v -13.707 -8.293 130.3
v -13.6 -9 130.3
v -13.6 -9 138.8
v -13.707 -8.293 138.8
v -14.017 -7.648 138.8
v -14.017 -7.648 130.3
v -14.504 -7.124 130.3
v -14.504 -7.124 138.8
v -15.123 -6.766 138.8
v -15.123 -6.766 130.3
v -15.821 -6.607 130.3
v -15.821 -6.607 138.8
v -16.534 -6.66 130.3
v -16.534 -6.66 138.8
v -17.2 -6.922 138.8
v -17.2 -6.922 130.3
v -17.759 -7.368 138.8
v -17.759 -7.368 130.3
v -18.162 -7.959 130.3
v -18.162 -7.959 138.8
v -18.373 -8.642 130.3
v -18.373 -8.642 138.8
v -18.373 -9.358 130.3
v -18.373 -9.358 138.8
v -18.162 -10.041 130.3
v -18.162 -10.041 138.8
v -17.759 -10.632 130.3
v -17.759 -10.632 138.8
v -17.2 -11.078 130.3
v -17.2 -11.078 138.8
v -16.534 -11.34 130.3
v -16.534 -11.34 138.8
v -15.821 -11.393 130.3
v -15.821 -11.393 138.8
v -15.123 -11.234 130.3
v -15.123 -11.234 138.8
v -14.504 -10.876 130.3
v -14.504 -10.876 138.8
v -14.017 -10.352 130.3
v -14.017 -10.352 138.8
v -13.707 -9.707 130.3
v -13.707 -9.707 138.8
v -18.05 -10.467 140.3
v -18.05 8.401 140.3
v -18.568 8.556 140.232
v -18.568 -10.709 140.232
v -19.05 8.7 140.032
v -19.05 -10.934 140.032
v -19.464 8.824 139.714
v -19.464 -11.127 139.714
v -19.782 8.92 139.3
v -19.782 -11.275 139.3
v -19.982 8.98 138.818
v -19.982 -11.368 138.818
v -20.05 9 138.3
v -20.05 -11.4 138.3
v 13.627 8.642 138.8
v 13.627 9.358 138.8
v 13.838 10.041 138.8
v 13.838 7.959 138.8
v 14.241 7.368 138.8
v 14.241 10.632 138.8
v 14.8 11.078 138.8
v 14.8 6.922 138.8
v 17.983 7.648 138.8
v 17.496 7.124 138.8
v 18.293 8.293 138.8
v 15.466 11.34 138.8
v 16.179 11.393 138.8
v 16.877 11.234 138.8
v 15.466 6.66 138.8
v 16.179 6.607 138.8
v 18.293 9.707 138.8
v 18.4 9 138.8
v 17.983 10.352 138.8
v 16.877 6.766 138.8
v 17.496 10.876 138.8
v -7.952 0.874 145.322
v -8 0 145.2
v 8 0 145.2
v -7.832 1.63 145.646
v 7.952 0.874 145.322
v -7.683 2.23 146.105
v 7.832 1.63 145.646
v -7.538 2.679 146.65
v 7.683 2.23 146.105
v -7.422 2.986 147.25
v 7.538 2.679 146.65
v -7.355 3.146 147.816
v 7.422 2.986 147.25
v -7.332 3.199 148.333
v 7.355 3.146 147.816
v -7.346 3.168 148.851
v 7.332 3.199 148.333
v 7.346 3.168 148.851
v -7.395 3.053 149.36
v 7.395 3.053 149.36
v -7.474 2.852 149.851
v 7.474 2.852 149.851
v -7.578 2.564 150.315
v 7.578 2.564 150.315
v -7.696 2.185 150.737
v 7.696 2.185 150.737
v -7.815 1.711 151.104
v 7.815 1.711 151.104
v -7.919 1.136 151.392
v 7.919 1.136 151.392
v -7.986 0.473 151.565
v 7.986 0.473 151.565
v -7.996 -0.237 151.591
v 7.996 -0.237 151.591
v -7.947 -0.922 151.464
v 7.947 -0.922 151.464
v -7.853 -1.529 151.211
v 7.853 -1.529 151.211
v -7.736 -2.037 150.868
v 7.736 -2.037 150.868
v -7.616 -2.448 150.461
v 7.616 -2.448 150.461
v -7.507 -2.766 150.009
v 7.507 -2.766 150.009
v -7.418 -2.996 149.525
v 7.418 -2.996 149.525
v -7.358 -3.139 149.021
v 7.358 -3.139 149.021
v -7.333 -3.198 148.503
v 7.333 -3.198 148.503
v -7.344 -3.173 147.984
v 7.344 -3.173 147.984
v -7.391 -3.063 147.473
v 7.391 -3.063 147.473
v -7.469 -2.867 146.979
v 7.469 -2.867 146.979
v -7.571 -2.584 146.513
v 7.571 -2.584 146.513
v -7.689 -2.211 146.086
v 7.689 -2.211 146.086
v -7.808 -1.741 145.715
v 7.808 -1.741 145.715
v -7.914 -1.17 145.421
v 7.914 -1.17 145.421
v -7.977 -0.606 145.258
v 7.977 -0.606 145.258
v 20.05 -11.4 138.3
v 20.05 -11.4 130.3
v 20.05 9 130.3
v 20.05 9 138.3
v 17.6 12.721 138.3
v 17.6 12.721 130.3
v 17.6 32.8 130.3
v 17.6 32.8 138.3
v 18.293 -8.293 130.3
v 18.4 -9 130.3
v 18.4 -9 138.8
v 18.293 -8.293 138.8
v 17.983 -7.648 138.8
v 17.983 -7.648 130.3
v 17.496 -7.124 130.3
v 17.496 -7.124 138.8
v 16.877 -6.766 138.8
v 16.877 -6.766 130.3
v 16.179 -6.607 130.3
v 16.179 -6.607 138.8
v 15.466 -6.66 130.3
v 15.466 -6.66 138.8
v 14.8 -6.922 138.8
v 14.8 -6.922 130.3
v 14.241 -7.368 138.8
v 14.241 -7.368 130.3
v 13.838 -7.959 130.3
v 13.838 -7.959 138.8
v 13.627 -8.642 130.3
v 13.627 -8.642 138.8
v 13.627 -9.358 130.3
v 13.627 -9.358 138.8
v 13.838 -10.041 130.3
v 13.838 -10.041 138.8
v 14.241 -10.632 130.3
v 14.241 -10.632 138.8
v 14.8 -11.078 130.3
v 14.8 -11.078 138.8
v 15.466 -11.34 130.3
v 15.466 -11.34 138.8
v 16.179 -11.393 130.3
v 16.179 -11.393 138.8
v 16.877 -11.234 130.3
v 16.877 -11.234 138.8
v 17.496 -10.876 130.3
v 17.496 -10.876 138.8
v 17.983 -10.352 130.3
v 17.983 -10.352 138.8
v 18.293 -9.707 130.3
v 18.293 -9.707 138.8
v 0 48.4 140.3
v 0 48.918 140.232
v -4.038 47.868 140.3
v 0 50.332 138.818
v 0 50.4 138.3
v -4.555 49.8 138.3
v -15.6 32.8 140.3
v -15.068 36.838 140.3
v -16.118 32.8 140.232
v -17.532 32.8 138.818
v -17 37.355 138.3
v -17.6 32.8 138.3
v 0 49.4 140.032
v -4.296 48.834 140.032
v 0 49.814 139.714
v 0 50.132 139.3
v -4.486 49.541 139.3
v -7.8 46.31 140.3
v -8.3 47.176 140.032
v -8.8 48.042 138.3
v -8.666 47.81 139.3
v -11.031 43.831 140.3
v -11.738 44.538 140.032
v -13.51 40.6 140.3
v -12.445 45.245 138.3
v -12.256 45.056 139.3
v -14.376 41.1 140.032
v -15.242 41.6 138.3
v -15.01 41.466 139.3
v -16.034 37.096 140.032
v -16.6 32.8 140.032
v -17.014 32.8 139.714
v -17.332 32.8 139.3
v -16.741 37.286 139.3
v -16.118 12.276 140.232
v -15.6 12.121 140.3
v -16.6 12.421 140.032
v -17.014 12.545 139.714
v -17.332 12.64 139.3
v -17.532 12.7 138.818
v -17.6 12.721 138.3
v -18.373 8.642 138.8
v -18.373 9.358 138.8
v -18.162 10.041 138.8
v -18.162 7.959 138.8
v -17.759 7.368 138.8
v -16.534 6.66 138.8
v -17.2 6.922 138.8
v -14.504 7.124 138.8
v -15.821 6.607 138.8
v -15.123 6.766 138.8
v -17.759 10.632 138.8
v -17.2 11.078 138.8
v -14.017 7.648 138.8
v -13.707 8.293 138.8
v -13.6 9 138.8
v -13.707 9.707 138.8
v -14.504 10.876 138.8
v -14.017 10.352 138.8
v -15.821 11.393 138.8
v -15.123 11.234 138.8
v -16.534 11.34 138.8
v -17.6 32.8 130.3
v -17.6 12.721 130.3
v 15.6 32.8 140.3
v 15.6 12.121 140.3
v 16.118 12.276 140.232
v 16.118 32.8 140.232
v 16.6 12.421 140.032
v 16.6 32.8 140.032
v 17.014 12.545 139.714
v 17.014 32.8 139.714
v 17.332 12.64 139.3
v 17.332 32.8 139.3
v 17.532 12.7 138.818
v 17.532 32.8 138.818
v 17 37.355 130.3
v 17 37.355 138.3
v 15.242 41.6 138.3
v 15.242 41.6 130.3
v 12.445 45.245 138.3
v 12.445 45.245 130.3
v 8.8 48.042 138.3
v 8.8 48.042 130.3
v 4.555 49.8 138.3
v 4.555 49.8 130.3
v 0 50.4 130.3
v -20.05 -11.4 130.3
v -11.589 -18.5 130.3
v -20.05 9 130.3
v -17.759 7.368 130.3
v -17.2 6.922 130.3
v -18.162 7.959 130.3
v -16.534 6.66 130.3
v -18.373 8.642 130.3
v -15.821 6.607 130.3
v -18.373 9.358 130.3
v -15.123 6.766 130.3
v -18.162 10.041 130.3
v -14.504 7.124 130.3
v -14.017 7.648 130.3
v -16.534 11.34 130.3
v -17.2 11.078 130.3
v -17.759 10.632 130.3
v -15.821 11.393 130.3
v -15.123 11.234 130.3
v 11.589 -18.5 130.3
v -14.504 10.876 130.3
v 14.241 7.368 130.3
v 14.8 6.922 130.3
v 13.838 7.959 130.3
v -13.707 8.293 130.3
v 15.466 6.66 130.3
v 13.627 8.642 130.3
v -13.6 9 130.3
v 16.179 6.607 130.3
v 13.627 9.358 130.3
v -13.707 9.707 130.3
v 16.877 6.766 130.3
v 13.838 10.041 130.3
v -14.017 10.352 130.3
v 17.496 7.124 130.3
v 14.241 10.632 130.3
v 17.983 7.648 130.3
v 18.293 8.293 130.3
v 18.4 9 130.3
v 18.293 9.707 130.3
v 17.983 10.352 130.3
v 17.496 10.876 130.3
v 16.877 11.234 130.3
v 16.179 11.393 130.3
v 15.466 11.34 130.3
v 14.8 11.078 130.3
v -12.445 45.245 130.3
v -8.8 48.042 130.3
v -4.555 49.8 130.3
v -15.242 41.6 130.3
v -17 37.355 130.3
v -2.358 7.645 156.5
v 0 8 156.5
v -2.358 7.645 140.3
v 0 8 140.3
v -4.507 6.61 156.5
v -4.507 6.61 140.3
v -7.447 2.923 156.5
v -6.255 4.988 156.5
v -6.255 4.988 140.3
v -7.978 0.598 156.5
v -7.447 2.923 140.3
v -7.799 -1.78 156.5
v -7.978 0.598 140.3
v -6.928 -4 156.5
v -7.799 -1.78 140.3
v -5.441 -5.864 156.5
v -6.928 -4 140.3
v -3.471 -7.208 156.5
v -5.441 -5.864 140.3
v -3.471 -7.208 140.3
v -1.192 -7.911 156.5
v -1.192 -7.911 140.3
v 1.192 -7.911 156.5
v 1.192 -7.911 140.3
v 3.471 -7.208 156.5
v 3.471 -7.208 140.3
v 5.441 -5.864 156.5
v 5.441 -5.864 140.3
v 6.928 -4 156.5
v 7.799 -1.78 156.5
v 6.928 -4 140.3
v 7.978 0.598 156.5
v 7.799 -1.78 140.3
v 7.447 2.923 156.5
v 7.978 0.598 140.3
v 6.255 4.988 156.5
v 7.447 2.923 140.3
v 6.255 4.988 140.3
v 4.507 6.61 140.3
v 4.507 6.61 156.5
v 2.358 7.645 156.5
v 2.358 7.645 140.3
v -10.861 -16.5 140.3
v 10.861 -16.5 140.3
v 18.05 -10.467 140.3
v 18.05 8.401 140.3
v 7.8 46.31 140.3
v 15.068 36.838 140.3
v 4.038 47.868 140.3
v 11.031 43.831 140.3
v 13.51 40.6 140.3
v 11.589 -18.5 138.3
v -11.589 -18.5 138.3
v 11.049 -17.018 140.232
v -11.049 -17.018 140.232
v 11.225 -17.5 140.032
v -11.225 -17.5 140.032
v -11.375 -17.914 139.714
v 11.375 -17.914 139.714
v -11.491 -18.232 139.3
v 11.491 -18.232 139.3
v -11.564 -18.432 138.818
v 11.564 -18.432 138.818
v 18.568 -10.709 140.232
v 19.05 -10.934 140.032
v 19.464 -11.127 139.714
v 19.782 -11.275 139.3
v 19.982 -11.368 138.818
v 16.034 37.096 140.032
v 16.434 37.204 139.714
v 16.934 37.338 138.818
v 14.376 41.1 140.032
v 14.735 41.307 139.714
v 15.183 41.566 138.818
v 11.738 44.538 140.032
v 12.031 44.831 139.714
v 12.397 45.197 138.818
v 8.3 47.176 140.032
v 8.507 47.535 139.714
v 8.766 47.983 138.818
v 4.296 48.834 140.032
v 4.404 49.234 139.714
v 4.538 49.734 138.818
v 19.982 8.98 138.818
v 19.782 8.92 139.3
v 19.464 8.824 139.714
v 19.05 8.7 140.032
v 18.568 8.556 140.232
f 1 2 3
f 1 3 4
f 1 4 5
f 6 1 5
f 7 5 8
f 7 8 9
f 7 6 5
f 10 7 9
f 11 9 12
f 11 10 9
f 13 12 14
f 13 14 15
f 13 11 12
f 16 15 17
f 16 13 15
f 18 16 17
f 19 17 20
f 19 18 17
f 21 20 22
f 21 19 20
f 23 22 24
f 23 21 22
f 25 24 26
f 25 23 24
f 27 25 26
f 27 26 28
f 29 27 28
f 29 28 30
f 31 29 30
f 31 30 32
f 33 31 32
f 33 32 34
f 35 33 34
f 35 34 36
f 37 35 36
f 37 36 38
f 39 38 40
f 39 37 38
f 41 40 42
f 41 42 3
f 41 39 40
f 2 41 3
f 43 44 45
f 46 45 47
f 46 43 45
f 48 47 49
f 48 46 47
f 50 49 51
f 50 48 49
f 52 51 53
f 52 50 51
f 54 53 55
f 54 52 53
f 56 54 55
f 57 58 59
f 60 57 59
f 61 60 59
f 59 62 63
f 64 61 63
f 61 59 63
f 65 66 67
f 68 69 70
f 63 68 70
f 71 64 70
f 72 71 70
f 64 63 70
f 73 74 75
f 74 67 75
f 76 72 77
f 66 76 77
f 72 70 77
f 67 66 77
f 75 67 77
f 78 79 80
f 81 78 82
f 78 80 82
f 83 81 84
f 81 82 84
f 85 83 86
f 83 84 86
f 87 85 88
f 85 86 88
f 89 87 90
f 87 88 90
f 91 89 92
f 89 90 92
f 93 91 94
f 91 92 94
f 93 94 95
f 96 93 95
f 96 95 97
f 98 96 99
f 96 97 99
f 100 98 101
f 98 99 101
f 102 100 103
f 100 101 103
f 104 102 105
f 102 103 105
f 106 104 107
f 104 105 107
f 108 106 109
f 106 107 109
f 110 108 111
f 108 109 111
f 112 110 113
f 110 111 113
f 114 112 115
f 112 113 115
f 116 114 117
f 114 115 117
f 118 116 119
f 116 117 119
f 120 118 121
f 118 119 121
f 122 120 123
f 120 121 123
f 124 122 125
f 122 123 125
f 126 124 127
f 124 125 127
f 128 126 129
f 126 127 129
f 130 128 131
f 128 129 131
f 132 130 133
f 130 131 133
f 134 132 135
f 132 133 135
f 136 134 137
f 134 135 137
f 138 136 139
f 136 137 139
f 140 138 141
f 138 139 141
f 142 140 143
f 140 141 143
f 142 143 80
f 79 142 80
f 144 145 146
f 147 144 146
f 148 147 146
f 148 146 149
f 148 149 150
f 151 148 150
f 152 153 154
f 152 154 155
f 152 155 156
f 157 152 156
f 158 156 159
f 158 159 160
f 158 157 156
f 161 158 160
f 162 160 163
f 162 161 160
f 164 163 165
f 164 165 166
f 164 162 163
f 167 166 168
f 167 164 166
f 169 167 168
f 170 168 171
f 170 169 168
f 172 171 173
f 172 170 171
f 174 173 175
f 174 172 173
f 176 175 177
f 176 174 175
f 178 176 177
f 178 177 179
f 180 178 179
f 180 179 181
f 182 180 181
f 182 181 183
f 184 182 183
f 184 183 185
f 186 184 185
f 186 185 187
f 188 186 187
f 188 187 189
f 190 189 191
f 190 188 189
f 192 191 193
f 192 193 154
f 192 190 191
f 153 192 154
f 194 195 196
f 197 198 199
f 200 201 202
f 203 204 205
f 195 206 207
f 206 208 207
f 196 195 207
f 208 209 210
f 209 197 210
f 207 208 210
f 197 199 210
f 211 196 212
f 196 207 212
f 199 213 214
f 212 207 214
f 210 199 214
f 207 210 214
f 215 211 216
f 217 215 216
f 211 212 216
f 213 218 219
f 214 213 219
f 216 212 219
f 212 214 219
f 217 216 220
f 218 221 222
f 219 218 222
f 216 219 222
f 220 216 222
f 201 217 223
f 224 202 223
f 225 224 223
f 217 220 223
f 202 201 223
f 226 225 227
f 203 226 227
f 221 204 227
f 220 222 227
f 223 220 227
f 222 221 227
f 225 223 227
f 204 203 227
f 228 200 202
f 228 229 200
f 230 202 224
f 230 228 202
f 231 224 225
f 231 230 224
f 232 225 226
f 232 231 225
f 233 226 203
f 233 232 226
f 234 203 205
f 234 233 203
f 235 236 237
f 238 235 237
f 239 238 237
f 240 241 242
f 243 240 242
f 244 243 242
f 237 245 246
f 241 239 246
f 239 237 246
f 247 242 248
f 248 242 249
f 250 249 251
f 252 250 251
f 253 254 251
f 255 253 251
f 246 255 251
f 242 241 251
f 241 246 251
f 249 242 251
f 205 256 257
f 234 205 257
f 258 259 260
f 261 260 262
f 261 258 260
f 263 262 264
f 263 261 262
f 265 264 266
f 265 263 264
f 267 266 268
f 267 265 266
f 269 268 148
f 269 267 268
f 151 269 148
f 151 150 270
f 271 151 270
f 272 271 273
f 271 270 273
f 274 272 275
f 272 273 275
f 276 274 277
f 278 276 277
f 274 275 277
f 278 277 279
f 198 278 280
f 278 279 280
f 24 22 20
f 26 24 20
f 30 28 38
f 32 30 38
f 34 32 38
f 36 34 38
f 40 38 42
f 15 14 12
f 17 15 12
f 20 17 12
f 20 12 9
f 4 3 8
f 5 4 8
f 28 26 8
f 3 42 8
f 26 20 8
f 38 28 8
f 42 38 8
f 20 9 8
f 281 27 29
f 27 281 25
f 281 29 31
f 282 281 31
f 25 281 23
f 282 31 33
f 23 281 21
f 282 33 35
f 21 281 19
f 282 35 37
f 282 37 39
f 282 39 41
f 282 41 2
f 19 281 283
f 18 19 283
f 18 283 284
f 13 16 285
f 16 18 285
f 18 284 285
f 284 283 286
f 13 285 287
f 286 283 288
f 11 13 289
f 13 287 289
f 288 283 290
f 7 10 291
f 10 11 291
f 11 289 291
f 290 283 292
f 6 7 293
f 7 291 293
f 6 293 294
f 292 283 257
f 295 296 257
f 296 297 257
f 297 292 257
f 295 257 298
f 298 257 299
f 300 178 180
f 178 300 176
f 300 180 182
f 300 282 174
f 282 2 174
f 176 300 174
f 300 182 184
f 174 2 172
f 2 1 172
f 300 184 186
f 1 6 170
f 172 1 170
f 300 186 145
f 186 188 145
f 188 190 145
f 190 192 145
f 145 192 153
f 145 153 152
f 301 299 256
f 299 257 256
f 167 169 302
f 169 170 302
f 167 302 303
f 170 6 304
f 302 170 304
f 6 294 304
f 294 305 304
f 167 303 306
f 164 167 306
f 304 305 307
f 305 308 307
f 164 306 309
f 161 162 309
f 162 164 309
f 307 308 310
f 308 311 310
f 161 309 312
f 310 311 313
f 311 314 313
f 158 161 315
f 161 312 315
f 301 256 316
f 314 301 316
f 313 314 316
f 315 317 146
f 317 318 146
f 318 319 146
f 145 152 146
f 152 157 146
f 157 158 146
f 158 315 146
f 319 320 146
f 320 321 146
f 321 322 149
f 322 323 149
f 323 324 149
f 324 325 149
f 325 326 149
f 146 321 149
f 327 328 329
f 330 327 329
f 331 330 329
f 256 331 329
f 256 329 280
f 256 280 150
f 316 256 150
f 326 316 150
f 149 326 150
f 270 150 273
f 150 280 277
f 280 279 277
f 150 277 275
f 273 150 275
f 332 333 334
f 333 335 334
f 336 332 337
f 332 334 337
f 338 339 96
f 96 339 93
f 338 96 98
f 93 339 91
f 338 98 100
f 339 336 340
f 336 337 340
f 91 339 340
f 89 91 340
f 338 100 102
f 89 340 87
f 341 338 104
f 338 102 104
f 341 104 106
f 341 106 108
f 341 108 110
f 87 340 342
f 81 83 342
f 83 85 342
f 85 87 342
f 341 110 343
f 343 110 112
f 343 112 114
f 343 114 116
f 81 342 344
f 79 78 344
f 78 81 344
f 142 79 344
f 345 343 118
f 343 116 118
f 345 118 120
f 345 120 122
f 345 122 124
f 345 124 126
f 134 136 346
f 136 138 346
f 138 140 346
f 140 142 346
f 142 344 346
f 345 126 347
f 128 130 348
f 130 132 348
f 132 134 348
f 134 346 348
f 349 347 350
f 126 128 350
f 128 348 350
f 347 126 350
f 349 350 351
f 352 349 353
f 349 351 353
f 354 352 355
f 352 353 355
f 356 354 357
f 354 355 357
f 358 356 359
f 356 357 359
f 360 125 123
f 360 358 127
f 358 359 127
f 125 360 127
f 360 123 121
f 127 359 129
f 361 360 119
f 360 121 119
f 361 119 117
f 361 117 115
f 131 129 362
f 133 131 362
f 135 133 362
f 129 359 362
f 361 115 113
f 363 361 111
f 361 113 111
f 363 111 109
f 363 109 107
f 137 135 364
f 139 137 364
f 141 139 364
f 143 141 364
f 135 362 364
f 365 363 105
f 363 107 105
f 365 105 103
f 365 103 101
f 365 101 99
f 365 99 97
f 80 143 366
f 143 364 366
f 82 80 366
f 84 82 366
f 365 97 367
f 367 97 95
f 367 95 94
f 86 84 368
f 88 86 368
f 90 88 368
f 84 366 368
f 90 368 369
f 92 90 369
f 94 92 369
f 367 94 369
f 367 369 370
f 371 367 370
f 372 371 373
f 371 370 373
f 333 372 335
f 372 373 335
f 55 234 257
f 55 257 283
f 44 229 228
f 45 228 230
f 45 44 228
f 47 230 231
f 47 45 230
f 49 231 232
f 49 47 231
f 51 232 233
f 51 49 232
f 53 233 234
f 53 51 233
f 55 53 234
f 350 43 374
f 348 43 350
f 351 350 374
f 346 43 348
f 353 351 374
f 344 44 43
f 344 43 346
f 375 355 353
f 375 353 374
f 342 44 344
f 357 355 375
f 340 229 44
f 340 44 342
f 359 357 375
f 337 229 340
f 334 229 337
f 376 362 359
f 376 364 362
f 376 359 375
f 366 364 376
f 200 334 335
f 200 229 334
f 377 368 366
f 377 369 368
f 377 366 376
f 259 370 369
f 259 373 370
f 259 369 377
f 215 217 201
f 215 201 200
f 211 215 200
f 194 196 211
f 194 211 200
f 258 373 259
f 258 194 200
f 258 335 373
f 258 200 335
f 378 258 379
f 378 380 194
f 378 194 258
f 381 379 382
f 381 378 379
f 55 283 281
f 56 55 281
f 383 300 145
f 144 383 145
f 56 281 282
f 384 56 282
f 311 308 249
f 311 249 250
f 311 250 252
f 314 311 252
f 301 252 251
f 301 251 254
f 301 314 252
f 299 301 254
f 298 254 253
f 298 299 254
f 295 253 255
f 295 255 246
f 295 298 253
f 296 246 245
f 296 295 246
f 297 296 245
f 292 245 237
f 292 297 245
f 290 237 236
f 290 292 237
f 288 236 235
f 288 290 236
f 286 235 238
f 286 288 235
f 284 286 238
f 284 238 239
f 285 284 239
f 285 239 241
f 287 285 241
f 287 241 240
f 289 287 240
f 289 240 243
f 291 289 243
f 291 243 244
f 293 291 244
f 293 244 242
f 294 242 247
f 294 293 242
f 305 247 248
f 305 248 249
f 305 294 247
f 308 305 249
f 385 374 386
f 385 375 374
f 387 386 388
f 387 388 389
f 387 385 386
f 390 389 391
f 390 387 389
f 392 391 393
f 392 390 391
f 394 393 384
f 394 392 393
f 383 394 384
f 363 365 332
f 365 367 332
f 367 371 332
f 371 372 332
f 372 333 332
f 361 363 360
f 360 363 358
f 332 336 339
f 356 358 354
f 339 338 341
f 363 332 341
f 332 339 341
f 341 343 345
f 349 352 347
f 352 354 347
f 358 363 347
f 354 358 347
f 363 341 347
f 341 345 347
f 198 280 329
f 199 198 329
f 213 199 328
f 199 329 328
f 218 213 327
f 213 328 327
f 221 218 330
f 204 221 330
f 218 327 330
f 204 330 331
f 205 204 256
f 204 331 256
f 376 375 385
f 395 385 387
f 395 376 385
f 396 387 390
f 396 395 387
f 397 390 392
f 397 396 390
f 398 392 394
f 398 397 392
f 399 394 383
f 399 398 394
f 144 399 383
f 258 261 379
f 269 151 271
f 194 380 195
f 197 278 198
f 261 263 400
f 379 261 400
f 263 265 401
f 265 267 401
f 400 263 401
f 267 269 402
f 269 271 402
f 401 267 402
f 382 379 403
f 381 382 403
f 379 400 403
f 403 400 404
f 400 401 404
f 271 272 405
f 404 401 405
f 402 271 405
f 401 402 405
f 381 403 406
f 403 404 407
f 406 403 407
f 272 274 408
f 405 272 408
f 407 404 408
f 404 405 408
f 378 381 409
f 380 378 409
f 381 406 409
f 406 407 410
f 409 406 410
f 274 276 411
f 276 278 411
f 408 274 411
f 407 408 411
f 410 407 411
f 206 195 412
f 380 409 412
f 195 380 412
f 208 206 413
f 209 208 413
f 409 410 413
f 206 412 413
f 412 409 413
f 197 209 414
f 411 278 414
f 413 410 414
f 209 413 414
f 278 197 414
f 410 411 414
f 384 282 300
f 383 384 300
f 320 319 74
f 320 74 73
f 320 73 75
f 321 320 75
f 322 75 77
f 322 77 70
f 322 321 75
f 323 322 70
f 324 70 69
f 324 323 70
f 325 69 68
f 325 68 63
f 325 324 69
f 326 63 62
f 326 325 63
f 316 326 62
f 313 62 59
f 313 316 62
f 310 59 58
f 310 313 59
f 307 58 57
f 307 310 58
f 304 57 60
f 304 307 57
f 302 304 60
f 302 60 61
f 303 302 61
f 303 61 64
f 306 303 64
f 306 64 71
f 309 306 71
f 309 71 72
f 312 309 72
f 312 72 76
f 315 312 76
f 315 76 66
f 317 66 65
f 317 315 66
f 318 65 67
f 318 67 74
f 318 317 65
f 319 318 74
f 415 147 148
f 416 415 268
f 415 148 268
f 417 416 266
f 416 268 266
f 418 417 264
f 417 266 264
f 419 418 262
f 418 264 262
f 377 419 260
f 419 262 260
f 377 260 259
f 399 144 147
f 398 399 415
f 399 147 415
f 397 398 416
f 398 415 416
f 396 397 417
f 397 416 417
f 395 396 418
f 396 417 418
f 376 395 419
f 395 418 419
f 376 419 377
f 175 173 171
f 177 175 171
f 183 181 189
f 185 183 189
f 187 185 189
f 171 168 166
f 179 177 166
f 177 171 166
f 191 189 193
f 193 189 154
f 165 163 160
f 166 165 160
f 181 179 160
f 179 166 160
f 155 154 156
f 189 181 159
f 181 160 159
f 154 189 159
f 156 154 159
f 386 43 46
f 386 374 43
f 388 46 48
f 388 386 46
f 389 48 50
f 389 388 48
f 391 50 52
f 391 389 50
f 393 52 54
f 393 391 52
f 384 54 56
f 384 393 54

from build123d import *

# Parameters (mm, degrees)
BODY_DEPTH               = 10
SKETCH3_W                = 16.2
SKETCH3_H                = 8
SKETCH7_R                = 3.2
REAR_MOUNTING_DEPTH      = 21.05
REAR_MOUNTING_DEPTH_BACK = 21.05
SKETCH8_R                = 2.4
HOLE_DEPTH               = 8.5
FILLET4_R                = 2


with BuildPart() as part:
    # Sketch1 → Body (new body)
    with BuildSketch(Plane.XY.offset(130.3)):
        with BuildLine():
            Line((20.05, 9), (17.6, 12.720551034))
            Line((17.6, 12.720551034), (17.6, 32.8))
            ThreePointArc((17.6, 32.8), (12.445079349, 45.245079349), (0, 50.4))
            ThreePointArc((0, 50.4), (-12.445079349, 45.245079349), (-17.6, 32.8))
            Line((-17.6, 32.8), (-17.6, 12.720551034))
            Line((-17.6, 12.720551034), (-20.05, 9))
            Line((-20.05, 9), (-20.05, 0))
            Line((-20.05, 0), (-20.05, -11.4))
            Line((-20.05, -11.4), (-11.588549493, -18.5))
            Line((-11.588549493, -18.5), (-7.016550666, -18.5))
            Line((-7.016550666, -18.5), (7.016550666, -18.5))
            Line((7.016550666, -18.5), (11.588549493, -18.5))
            Line((11.588549493, -18.5), (20.05, -11.4))
            Line((20.05, -11.4), (20.05, 0))
            Line((20.05, 0), (20.05, 9))
        make_face()
    extrude(amount=BODY_DEPTH)

    # Sketch3 → Motor-Body (revolve)
    with BuildSketch(Plane(origin=(0, 0, 0), x_dir=(0, 0, -1), z_dir=(1, 0, 0))):
        with Locations((-148.4, 4)):
            Rectangle(SKETCH3_W, SKETCH3_H)
    revolve(axis=Axis((0, 0, -96.607444662), (0, 0, 1)))

    # Sketch7 → Rear-Mounting (cut, two sides)
    with BuildSketch(Plane(origin=(0, 0, 0), x_dir=(0, 0, -1), z_dir=(1, 0, 0))) as rear_mounting_sk:
        with Locations((-148.4, 0)):
            Circle(SKETCH7_R)
    extrude(amount=REAR_MOUNTING_DEPTH, mode=Mode.SUBTRACT)
    extrude(rear_mounting_sk.sketch, amount=-REAR_MOUNTING_DEPTH_BACK, mode=Mode.SUBTRACT)

    # Sketch8 → Hole (cut)
    with BuildSketch(Plane.XY.offset(130.3)):
        with Locations((16, -9)):
            Circle(SKETCH8_R)
        with Locations((-16, -9)):
            Circle(SKETCH8_R)
        with Locations((-16, 9)):
            Circle(SKETCH8_R)
        with Locations((16, 9)):
            Circle(SKETCH8_R)
    extrude(amount=HOLE_DEPTH, mode=Mode.SUBTRACT)

    # Fillet4
    fillet4_edges = [part.edges().sort_by_distance(p)[0] for p in [
        (-17.6, 22.760275517, 140.3),
        (-18.825, 10.860275517, 140.3),
        (-20.05, -1.2, 140.3),
        (-15.819274746, -14.95, 140.3),
        (0, -18.5, 140.3),
        (15.819274746, -14.95, 140.3),
        (20.05, -1.2, 140.3),
        (0, 50.4, 140.3),
        (18.825, 10.860275517, 140.3),
        (17.6, 22.760275517, 140.3),
    ]]
    fillet(fillet4_edges, radius=FILLET4_R)


solid = part.part
